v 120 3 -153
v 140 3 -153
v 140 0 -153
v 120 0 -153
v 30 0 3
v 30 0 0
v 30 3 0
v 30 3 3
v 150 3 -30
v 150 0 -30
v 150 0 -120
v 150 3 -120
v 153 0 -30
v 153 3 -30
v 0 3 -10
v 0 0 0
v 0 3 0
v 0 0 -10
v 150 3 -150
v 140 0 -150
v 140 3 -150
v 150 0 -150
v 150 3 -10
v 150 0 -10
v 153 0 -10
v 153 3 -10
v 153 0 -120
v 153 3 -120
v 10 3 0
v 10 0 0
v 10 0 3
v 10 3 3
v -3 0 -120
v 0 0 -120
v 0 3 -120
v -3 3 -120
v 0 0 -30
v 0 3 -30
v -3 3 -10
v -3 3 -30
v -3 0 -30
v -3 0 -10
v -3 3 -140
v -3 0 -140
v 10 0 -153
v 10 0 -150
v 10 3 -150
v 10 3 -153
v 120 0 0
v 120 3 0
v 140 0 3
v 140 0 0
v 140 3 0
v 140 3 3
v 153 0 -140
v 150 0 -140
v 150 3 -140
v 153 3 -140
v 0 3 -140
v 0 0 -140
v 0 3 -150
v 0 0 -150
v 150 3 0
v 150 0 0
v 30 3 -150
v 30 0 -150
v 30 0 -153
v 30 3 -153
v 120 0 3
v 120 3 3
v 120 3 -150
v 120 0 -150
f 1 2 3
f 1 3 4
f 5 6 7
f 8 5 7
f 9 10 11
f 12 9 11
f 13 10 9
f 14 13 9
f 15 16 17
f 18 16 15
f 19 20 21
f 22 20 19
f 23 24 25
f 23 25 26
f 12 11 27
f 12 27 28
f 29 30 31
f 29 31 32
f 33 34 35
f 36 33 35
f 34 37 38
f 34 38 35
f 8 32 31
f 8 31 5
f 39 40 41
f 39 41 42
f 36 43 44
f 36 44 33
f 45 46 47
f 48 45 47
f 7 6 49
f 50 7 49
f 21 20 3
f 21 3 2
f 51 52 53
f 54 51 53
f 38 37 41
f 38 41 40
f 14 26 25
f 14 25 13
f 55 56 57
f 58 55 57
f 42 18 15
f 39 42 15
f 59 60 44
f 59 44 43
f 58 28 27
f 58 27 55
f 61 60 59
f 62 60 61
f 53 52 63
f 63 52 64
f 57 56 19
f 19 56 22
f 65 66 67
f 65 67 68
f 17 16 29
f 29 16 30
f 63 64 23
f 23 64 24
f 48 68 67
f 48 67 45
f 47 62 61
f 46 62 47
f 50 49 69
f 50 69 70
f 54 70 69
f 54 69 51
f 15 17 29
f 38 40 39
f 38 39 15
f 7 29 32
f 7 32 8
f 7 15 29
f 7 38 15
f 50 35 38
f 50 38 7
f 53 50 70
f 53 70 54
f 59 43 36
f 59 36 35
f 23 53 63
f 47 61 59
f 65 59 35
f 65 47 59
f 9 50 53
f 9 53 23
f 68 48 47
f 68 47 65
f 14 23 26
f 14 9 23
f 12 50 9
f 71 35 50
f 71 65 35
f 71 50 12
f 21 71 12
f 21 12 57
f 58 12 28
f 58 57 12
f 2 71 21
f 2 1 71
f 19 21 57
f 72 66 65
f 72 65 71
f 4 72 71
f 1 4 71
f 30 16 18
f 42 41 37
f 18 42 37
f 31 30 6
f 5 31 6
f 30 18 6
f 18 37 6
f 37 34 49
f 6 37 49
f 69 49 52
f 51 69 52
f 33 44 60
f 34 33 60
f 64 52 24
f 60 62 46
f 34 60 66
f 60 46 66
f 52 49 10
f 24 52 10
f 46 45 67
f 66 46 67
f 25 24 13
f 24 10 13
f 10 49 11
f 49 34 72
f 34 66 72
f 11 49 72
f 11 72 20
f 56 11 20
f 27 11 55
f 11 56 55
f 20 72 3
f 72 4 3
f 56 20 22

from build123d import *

# Parameters (mm, degrees)
SKETCH1_W            = 150
SKETCH1_H            = 150
BOSS_EXTRUDE9_DEPTH  = 3
SKETCH8_W            = 20
SKETCH8_H            = 3
BOSS_EXTRUDE10_DEPTH = 3
SKETCH9_W            = 20
SKETCH9_H            = 3
BOSS_EXTRUDE11_DEPTH = 3
SKETCH10_W           = 20
SKETCH10_H           = 3
BOSS_EXTRUDE12_DEPTH = 3
SKETCH11_W           = 20
SKETCH11_H           = 3
BOSS_EXTRUDE13_DEPTH = 3
SKETCH13_W           = 20
SKETCH13_H           = 3
BOSS_EXTRUDE14_DEPTH = 3
SKETCH14_W           = 20
SKETCH14_H           = 3
BOSS_EXTRUDE15_DEPTH = 3
SKETCH15_W           = 20
SKETCH15_H           = 3
BOSS_EXTRUDE16_DEPTH = 3
SKETCH16_W           = 20
SKETCH16_H           = 3
BOSS_EXTRUDE17_DEPTH = 3


with BuildPart() as part:
    # Sketch1 → Boss-Extrude9 (new body)
    with BuildSketch(Plane(origin=(0, 0, 0), x_dir=(1, 0, 0), z_dir=(0, 1, 0))):
        with Locations((75, 75)):
            Rectangle(SKETCH1_W, SKETCH1_H)
    extrude(amount=BOSS_EXTRUDE9_DEPTH)

    # Sketch8 → Boss-Extrude10 (add)
    with BuildSketch(Plane.ZY):
        with Locations((-20, 1.5)):
            Rectangle(SKETCH8_W, SKETCH8_H)
    extrude(amount=BOSS_EXTRUDE10_DEPTH)

    # Sketch9 → Boss-Extrude11 (add)
    with BuildSketch(Plane.XY):
        with Locations((20, 1.5)):
            Rectangle(SKETCH9_W, SKETCH9_H)
    extrude(amount=BOSS_EXTRUDE11_DEPTH)

    # Sketch10 → Boss-Extrude12 (add)
    with BuildSketch(Plane.XY):
        with Locations((130, 1.5)):
            Rectangle(SKETCH10_W, SKETCH10_H)
    extrude(amount=BOSS_EXTRUDE12_DEPTH)

    # Sketch11 → Boss-Extrude13 (add)
    with BuildSketch(Plane(origin=(150, 0, 0), x_dir=(0, 0, -1), z_dir=(1, 0, 0))):
        with Locations((20, 1.5)):
            Rectangle(SKETCH11_W, SKETCH11_H)
    extrude(amount=BOSS_EXTRUDE13_DEPTH)

    # Sketch13 → Boss-Extrude14 (add)
    with BuildSketch(Plane(origin=(150, 0, 0), x_dir=(0, 0, -1), z_dir=(1, 0, 0))):
        with Locations((130, 1.5)):
            Rectangle(SKETCH13_W, SKETCH13_H)
    extrude(amount=BOSS_EXTRUDE14_DEPTH)

    # Sketch14 → Boss-Extrude15 (add)
    with BuildSketch(Plane(origin=(0, 0, -150), x_dir=(-1, 0, 0), z_dir=(0, 0, -1))):
        with Locations((-130, 1.5)):
            Rectangle(SKETCH14_W, SKETCH14_H)
    extrude(amount=BOSS_EXTRUDE15_DEPTH)

    # Sketch15 → Boss-Extrude16 (add)
    with BuildSketch(Plane(origin=(0, 0, -150), x_dir=(-1, 0, 0), z_dir=(0, 0, -1))):
        with Locations((-20, 1.5)):
            Rectangle(SKETCH15_W, SKETCH15_H)
    extrude(amount=BOSS_EXTRUDE16_DEPTH)

    # Sketch16 → Boss-Extrude17 (add)
    with BuildSketch(Plane.ZY):
        with Locations((-130, 1.5)):
            Rectangle(SKETCH16_W, SKETCH16_H)
    extrude(amount=BOSS_EXTRUDE17_DEPTH)


solid = part.part
